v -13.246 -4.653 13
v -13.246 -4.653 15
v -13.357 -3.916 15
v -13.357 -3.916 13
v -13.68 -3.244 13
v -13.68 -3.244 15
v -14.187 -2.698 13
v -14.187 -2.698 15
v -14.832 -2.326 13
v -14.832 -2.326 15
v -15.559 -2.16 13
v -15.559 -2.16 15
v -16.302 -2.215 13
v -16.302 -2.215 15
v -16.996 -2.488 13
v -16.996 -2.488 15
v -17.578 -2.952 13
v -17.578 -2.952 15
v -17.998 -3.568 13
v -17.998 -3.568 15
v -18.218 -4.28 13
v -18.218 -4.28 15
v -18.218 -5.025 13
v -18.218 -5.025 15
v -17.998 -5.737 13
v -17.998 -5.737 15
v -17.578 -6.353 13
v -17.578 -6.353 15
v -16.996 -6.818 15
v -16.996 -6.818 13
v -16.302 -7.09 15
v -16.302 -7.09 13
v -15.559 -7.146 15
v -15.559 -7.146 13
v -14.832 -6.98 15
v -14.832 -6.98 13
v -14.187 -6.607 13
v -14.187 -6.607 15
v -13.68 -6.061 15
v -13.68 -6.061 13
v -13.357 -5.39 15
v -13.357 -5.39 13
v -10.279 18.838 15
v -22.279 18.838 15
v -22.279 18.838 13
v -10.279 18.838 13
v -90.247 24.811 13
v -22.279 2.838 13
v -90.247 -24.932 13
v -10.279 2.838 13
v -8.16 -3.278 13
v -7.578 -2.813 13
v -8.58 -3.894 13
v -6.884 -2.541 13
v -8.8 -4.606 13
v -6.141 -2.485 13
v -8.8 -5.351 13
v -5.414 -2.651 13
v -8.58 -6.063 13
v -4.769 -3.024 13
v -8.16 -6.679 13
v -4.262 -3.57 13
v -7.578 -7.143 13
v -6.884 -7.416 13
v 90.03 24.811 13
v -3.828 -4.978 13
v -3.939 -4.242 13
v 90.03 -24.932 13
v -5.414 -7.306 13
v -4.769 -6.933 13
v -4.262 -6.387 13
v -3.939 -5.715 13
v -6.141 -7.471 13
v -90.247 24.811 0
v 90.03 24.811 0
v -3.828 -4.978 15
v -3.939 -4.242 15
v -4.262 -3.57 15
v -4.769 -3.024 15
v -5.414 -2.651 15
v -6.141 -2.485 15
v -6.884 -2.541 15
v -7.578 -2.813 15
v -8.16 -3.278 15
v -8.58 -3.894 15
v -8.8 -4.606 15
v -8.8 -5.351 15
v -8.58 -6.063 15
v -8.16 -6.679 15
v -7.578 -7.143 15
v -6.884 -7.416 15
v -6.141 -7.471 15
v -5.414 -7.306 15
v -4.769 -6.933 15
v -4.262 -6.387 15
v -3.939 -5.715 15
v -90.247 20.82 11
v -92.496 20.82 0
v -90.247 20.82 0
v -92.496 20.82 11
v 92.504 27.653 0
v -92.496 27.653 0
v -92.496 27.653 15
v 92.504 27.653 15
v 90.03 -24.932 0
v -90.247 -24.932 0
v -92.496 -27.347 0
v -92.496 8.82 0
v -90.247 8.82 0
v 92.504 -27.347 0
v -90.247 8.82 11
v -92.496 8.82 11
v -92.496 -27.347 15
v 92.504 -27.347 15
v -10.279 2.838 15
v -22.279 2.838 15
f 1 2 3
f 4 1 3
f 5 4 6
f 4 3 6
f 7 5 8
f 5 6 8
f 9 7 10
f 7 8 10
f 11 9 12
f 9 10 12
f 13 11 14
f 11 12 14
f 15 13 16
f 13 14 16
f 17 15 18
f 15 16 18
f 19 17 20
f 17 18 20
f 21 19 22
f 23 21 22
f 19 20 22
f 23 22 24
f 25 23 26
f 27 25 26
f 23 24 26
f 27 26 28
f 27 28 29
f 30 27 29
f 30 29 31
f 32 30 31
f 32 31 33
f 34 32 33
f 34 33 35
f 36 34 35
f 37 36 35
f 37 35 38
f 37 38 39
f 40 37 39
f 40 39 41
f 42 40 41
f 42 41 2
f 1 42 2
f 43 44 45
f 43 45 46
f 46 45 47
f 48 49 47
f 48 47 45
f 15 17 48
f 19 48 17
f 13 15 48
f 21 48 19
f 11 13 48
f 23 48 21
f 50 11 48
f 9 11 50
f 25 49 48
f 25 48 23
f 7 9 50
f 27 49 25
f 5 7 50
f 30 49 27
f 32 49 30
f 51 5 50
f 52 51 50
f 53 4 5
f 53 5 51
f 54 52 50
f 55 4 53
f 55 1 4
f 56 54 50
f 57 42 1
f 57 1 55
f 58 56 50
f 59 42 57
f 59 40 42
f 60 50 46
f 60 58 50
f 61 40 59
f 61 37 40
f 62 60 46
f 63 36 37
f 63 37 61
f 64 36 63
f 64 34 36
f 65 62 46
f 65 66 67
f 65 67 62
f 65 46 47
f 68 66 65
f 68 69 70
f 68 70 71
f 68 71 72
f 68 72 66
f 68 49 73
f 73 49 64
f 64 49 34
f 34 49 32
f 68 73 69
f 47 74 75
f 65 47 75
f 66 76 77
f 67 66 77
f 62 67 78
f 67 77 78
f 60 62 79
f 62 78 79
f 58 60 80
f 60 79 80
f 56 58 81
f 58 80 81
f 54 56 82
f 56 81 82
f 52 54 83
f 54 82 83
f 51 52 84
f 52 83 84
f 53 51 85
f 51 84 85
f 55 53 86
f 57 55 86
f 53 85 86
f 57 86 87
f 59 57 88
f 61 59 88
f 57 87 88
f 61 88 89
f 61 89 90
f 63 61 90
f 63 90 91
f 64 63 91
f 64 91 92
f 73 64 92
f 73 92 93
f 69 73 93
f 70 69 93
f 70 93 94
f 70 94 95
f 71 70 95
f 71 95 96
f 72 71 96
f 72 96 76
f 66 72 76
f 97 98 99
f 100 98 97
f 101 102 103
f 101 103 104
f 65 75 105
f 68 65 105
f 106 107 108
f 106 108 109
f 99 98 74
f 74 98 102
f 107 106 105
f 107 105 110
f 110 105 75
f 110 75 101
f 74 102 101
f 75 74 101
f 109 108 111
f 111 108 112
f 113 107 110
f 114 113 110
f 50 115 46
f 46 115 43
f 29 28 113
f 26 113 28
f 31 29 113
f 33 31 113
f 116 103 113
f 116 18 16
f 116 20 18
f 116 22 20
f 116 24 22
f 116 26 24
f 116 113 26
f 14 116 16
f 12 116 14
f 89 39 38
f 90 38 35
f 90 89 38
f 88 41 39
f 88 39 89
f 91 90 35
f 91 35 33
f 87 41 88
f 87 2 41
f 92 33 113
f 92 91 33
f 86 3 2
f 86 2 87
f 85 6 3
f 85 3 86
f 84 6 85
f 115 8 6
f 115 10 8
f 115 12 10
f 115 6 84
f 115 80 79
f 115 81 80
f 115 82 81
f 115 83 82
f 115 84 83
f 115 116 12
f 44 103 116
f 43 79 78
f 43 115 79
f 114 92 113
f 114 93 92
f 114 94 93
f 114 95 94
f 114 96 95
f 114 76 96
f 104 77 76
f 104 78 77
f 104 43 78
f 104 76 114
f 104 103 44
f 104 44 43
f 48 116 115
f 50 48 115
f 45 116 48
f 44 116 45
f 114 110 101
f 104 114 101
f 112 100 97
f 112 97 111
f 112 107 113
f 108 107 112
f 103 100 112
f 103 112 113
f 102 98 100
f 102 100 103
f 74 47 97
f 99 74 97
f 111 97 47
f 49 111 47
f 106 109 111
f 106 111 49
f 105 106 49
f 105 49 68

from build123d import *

# Parameters (mm, degrees)
SKETCH_W        = 185
SKETCH_H        = 55
PAD_DEPTH       = 15
SKETCH001_R     = 2.5
SKETCH001_W     = 12
SKETCH001_H     = 16
POCKET_DEPTH    = 5
SKETCH002_W     = 12
SKETCH002_H     = 11
POCKET001_DEPTH = 5
SKETCH003_W     = 180.277405
SKETCH003_H     = 49.743215
POCKET002_DEPTH = 13


with BuildPart() as part:
    # Sketch → Pad (new body)
    with BuildSketch(Plane.XY):
        with Locations((0.0037, 0.153081)):
            Rectangle(SKETCH_W, SKETCH_H)
    extrude(amount=PAD_DEPTH)

    # Sketch001 (on Face6 of Pad) → Pocket (cut)
    with BuildSketch(Plane.XY.offset(15)):
        with Locations((-15.745548, -4.652688)):
            Circle(SKETCH001_R)
        with Locations((-6.327735, -4.978416)):
            Circle(SKETCH001_R)
        with Locations((-16.279421, 10.837662)):
            Rectangle(SKETCH001_W, SKETCH001_H)
    extrude(amount=-POCKET_DEPTH, mode=Mode.SUBTRACT)

    # Sketch002 (on Face1 of Pad) → Pocket001 (cut)
    with BuildSketch(Plane(origin=(-92.4963, 0, 0), x_dir=(0, -1, 0), z_dir=(-1, 0, 0))):
        with Locations((-14.820227, 5.5)):
            Rectangle(SKETCH002_W, SKETCH002_H)
    extrude(amount=-POCKET001_DEPTH, mode=Mode.SUBTRACT)

    # Sketch003 (on Face5 of Pad) → Pocket002 (cut)
    with BuildSketch(Plane(origin=(0, 0, 0), x_dir=(1, 0, 0), z_dir=(0, 0, -1))):
        with Locations((-0.108376, 0.060574)):
            Rectangle(SKETCH003_W, SKETCH003_H)
    extrude(amount=-POCKET002_DEPTH, mode=Mode.SUBTRACT)


solid = part.part
